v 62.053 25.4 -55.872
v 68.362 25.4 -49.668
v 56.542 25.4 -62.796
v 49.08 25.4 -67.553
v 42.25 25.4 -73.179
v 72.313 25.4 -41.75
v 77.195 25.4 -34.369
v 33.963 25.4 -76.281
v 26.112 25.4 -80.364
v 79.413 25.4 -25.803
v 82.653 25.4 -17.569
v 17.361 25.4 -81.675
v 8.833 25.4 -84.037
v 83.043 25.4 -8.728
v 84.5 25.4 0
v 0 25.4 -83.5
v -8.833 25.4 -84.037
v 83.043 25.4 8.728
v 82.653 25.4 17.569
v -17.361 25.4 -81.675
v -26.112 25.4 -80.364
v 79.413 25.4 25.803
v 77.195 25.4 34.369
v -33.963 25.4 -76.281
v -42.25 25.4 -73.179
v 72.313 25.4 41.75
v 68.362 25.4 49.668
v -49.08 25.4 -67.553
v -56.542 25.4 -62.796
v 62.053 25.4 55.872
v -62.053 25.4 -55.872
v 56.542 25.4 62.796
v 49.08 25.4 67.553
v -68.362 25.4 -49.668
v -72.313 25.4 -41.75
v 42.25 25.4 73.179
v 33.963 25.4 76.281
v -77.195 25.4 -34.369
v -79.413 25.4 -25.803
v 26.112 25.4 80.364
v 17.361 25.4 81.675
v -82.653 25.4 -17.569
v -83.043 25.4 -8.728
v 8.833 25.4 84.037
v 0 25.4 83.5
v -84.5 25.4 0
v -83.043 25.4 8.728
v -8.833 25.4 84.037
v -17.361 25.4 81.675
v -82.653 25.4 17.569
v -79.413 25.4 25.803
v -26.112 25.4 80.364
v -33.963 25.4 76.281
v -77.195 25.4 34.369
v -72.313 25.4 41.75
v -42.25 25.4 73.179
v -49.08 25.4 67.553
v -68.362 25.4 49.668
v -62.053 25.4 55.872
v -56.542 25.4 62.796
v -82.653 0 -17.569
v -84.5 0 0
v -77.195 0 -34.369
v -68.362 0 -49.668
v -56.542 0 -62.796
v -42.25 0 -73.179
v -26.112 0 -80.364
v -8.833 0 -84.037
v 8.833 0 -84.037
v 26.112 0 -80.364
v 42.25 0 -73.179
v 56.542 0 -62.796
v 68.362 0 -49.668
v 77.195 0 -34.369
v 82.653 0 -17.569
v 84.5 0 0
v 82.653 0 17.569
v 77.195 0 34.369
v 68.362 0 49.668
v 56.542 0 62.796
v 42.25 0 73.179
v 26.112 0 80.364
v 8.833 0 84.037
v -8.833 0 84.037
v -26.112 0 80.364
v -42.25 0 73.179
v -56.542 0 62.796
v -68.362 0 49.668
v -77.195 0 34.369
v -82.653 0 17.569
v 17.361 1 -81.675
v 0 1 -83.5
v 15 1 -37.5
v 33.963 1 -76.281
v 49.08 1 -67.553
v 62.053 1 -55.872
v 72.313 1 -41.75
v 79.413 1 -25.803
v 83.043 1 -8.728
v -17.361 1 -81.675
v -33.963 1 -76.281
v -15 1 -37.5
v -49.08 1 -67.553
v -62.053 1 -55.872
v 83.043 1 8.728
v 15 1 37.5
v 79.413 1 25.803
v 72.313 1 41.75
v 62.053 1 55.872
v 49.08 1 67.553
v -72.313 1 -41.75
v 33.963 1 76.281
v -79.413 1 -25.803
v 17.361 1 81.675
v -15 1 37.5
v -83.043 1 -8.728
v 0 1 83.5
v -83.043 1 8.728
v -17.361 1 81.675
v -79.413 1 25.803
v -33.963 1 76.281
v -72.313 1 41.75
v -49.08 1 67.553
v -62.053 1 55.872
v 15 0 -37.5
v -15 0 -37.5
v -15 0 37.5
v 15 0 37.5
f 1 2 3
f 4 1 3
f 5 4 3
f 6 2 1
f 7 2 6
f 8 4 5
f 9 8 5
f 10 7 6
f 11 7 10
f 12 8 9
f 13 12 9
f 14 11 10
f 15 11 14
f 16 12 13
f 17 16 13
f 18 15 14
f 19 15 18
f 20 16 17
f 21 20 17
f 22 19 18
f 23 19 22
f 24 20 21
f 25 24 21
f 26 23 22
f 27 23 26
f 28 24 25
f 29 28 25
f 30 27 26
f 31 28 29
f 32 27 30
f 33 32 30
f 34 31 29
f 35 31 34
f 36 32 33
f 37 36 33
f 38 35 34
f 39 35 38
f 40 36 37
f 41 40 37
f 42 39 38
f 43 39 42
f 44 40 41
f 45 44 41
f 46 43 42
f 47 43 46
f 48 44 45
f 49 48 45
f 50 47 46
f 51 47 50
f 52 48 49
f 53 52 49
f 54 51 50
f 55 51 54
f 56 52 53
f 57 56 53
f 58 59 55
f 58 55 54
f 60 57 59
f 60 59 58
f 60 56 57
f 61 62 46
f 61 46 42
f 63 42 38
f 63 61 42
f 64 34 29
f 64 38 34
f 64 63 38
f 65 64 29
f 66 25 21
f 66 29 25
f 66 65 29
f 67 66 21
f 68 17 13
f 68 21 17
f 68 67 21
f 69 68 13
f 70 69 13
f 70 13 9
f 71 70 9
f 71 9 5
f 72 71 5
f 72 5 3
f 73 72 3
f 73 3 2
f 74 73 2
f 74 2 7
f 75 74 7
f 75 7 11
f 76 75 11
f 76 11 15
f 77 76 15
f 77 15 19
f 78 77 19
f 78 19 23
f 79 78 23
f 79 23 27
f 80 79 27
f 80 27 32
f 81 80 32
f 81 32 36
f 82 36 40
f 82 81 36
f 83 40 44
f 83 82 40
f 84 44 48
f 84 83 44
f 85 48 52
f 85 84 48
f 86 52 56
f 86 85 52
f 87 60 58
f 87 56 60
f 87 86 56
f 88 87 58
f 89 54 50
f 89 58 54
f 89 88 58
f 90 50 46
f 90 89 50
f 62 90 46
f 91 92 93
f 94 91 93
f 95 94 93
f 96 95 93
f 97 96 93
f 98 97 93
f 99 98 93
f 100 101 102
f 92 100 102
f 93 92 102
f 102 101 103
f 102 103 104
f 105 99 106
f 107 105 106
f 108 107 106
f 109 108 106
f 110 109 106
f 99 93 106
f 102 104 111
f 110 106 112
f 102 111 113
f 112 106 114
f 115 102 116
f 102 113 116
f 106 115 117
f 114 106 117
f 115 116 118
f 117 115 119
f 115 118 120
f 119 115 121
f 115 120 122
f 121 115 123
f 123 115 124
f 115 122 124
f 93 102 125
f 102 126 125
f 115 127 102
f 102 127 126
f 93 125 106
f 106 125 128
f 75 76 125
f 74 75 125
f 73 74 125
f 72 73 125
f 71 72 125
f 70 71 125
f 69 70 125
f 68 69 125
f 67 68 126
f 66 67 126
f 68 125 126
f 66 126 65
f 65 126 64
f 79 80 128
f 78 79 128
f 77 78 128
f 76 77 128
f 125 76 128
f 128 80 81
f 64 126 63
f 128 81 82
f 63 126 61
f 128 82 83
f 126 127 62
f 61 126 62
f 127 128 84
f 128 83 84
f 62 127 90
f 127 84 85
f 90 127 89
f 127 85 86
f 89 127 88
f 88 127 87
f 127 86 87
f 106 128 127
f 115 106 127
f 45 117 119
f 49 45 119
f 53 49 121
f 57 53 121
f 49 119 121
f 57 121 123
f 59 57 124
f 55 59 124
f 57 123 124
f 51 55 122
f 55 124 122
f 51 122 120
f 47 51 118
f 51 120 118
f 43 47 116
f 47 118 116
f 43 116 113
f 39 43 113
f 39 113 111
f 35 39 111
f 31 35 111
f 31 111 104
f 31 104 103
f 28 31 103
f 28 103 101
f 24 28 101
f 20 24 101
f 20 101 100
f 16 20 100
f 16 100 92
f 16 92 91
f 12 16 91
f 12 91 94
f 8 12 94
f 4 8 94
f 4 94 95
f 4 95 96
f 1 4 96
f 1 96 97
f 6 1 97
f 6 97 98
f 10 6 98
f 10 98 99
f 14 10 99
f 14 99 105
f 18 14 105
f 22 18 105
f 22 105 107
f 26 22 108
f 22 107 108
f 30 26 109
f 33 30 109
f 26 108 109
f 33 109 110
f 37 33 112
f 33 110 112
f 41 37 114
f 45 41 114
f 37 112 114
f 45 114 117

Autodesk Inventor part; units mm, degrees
ref_plane "YZ Plane" through (0, 0, 0) normal (1, 0, 0) x (0, 1, 0)
ref_plane "XZ Plane" through (0, 0, 0) normal (0, 1, 0) x (-1, 0, 0)
ref_plane "XY Plane" through (0, 0, 0) normal (0, 0, 1) x (1, 0, 0)
sketch "Sketch1" plane through (0, 0, 0) normal (0, 1, 0) x (-1, 0, 0)
  circle A0 centre (0, 0) radius 84.5
  line L0 (-15, 37.5) -> (15, 37.5)
  line L1 (15, 37.5) -> (15, -37.5)
  line L2 (15, -37.5) -> (-15, -37.5)
  line L3 (-15, -37.5) -> (-15, 37.5)
  line L4 (-15, 37.5) -> (15, -37.5) construction
  line L5 (15, 37.5) -> (-15, -37.5) construction
  dimension "d1" = 169
  dimension "d41" = 30
  dimension "d42" = 75
extrude "Extrusion4" add sketch "Sketch1" along normal blind 25.4
sketch "Sketch4" plane through (0, 25.4, 0) normal (0, 1, 0) x (1, 0, 0)
  circle A0 centre (0, 0) radius 83.5
  dimension "d45" = 167
hole "Hole2" at (0, 25.4, 0) direction (0, -1, 0) diameter 167 depth 24.4
ref_plane "Work Plane1" through (0, 0, 37.5) normal (1, 0, 0) x (0, 0, -1)
properties part number "Top Cap"
